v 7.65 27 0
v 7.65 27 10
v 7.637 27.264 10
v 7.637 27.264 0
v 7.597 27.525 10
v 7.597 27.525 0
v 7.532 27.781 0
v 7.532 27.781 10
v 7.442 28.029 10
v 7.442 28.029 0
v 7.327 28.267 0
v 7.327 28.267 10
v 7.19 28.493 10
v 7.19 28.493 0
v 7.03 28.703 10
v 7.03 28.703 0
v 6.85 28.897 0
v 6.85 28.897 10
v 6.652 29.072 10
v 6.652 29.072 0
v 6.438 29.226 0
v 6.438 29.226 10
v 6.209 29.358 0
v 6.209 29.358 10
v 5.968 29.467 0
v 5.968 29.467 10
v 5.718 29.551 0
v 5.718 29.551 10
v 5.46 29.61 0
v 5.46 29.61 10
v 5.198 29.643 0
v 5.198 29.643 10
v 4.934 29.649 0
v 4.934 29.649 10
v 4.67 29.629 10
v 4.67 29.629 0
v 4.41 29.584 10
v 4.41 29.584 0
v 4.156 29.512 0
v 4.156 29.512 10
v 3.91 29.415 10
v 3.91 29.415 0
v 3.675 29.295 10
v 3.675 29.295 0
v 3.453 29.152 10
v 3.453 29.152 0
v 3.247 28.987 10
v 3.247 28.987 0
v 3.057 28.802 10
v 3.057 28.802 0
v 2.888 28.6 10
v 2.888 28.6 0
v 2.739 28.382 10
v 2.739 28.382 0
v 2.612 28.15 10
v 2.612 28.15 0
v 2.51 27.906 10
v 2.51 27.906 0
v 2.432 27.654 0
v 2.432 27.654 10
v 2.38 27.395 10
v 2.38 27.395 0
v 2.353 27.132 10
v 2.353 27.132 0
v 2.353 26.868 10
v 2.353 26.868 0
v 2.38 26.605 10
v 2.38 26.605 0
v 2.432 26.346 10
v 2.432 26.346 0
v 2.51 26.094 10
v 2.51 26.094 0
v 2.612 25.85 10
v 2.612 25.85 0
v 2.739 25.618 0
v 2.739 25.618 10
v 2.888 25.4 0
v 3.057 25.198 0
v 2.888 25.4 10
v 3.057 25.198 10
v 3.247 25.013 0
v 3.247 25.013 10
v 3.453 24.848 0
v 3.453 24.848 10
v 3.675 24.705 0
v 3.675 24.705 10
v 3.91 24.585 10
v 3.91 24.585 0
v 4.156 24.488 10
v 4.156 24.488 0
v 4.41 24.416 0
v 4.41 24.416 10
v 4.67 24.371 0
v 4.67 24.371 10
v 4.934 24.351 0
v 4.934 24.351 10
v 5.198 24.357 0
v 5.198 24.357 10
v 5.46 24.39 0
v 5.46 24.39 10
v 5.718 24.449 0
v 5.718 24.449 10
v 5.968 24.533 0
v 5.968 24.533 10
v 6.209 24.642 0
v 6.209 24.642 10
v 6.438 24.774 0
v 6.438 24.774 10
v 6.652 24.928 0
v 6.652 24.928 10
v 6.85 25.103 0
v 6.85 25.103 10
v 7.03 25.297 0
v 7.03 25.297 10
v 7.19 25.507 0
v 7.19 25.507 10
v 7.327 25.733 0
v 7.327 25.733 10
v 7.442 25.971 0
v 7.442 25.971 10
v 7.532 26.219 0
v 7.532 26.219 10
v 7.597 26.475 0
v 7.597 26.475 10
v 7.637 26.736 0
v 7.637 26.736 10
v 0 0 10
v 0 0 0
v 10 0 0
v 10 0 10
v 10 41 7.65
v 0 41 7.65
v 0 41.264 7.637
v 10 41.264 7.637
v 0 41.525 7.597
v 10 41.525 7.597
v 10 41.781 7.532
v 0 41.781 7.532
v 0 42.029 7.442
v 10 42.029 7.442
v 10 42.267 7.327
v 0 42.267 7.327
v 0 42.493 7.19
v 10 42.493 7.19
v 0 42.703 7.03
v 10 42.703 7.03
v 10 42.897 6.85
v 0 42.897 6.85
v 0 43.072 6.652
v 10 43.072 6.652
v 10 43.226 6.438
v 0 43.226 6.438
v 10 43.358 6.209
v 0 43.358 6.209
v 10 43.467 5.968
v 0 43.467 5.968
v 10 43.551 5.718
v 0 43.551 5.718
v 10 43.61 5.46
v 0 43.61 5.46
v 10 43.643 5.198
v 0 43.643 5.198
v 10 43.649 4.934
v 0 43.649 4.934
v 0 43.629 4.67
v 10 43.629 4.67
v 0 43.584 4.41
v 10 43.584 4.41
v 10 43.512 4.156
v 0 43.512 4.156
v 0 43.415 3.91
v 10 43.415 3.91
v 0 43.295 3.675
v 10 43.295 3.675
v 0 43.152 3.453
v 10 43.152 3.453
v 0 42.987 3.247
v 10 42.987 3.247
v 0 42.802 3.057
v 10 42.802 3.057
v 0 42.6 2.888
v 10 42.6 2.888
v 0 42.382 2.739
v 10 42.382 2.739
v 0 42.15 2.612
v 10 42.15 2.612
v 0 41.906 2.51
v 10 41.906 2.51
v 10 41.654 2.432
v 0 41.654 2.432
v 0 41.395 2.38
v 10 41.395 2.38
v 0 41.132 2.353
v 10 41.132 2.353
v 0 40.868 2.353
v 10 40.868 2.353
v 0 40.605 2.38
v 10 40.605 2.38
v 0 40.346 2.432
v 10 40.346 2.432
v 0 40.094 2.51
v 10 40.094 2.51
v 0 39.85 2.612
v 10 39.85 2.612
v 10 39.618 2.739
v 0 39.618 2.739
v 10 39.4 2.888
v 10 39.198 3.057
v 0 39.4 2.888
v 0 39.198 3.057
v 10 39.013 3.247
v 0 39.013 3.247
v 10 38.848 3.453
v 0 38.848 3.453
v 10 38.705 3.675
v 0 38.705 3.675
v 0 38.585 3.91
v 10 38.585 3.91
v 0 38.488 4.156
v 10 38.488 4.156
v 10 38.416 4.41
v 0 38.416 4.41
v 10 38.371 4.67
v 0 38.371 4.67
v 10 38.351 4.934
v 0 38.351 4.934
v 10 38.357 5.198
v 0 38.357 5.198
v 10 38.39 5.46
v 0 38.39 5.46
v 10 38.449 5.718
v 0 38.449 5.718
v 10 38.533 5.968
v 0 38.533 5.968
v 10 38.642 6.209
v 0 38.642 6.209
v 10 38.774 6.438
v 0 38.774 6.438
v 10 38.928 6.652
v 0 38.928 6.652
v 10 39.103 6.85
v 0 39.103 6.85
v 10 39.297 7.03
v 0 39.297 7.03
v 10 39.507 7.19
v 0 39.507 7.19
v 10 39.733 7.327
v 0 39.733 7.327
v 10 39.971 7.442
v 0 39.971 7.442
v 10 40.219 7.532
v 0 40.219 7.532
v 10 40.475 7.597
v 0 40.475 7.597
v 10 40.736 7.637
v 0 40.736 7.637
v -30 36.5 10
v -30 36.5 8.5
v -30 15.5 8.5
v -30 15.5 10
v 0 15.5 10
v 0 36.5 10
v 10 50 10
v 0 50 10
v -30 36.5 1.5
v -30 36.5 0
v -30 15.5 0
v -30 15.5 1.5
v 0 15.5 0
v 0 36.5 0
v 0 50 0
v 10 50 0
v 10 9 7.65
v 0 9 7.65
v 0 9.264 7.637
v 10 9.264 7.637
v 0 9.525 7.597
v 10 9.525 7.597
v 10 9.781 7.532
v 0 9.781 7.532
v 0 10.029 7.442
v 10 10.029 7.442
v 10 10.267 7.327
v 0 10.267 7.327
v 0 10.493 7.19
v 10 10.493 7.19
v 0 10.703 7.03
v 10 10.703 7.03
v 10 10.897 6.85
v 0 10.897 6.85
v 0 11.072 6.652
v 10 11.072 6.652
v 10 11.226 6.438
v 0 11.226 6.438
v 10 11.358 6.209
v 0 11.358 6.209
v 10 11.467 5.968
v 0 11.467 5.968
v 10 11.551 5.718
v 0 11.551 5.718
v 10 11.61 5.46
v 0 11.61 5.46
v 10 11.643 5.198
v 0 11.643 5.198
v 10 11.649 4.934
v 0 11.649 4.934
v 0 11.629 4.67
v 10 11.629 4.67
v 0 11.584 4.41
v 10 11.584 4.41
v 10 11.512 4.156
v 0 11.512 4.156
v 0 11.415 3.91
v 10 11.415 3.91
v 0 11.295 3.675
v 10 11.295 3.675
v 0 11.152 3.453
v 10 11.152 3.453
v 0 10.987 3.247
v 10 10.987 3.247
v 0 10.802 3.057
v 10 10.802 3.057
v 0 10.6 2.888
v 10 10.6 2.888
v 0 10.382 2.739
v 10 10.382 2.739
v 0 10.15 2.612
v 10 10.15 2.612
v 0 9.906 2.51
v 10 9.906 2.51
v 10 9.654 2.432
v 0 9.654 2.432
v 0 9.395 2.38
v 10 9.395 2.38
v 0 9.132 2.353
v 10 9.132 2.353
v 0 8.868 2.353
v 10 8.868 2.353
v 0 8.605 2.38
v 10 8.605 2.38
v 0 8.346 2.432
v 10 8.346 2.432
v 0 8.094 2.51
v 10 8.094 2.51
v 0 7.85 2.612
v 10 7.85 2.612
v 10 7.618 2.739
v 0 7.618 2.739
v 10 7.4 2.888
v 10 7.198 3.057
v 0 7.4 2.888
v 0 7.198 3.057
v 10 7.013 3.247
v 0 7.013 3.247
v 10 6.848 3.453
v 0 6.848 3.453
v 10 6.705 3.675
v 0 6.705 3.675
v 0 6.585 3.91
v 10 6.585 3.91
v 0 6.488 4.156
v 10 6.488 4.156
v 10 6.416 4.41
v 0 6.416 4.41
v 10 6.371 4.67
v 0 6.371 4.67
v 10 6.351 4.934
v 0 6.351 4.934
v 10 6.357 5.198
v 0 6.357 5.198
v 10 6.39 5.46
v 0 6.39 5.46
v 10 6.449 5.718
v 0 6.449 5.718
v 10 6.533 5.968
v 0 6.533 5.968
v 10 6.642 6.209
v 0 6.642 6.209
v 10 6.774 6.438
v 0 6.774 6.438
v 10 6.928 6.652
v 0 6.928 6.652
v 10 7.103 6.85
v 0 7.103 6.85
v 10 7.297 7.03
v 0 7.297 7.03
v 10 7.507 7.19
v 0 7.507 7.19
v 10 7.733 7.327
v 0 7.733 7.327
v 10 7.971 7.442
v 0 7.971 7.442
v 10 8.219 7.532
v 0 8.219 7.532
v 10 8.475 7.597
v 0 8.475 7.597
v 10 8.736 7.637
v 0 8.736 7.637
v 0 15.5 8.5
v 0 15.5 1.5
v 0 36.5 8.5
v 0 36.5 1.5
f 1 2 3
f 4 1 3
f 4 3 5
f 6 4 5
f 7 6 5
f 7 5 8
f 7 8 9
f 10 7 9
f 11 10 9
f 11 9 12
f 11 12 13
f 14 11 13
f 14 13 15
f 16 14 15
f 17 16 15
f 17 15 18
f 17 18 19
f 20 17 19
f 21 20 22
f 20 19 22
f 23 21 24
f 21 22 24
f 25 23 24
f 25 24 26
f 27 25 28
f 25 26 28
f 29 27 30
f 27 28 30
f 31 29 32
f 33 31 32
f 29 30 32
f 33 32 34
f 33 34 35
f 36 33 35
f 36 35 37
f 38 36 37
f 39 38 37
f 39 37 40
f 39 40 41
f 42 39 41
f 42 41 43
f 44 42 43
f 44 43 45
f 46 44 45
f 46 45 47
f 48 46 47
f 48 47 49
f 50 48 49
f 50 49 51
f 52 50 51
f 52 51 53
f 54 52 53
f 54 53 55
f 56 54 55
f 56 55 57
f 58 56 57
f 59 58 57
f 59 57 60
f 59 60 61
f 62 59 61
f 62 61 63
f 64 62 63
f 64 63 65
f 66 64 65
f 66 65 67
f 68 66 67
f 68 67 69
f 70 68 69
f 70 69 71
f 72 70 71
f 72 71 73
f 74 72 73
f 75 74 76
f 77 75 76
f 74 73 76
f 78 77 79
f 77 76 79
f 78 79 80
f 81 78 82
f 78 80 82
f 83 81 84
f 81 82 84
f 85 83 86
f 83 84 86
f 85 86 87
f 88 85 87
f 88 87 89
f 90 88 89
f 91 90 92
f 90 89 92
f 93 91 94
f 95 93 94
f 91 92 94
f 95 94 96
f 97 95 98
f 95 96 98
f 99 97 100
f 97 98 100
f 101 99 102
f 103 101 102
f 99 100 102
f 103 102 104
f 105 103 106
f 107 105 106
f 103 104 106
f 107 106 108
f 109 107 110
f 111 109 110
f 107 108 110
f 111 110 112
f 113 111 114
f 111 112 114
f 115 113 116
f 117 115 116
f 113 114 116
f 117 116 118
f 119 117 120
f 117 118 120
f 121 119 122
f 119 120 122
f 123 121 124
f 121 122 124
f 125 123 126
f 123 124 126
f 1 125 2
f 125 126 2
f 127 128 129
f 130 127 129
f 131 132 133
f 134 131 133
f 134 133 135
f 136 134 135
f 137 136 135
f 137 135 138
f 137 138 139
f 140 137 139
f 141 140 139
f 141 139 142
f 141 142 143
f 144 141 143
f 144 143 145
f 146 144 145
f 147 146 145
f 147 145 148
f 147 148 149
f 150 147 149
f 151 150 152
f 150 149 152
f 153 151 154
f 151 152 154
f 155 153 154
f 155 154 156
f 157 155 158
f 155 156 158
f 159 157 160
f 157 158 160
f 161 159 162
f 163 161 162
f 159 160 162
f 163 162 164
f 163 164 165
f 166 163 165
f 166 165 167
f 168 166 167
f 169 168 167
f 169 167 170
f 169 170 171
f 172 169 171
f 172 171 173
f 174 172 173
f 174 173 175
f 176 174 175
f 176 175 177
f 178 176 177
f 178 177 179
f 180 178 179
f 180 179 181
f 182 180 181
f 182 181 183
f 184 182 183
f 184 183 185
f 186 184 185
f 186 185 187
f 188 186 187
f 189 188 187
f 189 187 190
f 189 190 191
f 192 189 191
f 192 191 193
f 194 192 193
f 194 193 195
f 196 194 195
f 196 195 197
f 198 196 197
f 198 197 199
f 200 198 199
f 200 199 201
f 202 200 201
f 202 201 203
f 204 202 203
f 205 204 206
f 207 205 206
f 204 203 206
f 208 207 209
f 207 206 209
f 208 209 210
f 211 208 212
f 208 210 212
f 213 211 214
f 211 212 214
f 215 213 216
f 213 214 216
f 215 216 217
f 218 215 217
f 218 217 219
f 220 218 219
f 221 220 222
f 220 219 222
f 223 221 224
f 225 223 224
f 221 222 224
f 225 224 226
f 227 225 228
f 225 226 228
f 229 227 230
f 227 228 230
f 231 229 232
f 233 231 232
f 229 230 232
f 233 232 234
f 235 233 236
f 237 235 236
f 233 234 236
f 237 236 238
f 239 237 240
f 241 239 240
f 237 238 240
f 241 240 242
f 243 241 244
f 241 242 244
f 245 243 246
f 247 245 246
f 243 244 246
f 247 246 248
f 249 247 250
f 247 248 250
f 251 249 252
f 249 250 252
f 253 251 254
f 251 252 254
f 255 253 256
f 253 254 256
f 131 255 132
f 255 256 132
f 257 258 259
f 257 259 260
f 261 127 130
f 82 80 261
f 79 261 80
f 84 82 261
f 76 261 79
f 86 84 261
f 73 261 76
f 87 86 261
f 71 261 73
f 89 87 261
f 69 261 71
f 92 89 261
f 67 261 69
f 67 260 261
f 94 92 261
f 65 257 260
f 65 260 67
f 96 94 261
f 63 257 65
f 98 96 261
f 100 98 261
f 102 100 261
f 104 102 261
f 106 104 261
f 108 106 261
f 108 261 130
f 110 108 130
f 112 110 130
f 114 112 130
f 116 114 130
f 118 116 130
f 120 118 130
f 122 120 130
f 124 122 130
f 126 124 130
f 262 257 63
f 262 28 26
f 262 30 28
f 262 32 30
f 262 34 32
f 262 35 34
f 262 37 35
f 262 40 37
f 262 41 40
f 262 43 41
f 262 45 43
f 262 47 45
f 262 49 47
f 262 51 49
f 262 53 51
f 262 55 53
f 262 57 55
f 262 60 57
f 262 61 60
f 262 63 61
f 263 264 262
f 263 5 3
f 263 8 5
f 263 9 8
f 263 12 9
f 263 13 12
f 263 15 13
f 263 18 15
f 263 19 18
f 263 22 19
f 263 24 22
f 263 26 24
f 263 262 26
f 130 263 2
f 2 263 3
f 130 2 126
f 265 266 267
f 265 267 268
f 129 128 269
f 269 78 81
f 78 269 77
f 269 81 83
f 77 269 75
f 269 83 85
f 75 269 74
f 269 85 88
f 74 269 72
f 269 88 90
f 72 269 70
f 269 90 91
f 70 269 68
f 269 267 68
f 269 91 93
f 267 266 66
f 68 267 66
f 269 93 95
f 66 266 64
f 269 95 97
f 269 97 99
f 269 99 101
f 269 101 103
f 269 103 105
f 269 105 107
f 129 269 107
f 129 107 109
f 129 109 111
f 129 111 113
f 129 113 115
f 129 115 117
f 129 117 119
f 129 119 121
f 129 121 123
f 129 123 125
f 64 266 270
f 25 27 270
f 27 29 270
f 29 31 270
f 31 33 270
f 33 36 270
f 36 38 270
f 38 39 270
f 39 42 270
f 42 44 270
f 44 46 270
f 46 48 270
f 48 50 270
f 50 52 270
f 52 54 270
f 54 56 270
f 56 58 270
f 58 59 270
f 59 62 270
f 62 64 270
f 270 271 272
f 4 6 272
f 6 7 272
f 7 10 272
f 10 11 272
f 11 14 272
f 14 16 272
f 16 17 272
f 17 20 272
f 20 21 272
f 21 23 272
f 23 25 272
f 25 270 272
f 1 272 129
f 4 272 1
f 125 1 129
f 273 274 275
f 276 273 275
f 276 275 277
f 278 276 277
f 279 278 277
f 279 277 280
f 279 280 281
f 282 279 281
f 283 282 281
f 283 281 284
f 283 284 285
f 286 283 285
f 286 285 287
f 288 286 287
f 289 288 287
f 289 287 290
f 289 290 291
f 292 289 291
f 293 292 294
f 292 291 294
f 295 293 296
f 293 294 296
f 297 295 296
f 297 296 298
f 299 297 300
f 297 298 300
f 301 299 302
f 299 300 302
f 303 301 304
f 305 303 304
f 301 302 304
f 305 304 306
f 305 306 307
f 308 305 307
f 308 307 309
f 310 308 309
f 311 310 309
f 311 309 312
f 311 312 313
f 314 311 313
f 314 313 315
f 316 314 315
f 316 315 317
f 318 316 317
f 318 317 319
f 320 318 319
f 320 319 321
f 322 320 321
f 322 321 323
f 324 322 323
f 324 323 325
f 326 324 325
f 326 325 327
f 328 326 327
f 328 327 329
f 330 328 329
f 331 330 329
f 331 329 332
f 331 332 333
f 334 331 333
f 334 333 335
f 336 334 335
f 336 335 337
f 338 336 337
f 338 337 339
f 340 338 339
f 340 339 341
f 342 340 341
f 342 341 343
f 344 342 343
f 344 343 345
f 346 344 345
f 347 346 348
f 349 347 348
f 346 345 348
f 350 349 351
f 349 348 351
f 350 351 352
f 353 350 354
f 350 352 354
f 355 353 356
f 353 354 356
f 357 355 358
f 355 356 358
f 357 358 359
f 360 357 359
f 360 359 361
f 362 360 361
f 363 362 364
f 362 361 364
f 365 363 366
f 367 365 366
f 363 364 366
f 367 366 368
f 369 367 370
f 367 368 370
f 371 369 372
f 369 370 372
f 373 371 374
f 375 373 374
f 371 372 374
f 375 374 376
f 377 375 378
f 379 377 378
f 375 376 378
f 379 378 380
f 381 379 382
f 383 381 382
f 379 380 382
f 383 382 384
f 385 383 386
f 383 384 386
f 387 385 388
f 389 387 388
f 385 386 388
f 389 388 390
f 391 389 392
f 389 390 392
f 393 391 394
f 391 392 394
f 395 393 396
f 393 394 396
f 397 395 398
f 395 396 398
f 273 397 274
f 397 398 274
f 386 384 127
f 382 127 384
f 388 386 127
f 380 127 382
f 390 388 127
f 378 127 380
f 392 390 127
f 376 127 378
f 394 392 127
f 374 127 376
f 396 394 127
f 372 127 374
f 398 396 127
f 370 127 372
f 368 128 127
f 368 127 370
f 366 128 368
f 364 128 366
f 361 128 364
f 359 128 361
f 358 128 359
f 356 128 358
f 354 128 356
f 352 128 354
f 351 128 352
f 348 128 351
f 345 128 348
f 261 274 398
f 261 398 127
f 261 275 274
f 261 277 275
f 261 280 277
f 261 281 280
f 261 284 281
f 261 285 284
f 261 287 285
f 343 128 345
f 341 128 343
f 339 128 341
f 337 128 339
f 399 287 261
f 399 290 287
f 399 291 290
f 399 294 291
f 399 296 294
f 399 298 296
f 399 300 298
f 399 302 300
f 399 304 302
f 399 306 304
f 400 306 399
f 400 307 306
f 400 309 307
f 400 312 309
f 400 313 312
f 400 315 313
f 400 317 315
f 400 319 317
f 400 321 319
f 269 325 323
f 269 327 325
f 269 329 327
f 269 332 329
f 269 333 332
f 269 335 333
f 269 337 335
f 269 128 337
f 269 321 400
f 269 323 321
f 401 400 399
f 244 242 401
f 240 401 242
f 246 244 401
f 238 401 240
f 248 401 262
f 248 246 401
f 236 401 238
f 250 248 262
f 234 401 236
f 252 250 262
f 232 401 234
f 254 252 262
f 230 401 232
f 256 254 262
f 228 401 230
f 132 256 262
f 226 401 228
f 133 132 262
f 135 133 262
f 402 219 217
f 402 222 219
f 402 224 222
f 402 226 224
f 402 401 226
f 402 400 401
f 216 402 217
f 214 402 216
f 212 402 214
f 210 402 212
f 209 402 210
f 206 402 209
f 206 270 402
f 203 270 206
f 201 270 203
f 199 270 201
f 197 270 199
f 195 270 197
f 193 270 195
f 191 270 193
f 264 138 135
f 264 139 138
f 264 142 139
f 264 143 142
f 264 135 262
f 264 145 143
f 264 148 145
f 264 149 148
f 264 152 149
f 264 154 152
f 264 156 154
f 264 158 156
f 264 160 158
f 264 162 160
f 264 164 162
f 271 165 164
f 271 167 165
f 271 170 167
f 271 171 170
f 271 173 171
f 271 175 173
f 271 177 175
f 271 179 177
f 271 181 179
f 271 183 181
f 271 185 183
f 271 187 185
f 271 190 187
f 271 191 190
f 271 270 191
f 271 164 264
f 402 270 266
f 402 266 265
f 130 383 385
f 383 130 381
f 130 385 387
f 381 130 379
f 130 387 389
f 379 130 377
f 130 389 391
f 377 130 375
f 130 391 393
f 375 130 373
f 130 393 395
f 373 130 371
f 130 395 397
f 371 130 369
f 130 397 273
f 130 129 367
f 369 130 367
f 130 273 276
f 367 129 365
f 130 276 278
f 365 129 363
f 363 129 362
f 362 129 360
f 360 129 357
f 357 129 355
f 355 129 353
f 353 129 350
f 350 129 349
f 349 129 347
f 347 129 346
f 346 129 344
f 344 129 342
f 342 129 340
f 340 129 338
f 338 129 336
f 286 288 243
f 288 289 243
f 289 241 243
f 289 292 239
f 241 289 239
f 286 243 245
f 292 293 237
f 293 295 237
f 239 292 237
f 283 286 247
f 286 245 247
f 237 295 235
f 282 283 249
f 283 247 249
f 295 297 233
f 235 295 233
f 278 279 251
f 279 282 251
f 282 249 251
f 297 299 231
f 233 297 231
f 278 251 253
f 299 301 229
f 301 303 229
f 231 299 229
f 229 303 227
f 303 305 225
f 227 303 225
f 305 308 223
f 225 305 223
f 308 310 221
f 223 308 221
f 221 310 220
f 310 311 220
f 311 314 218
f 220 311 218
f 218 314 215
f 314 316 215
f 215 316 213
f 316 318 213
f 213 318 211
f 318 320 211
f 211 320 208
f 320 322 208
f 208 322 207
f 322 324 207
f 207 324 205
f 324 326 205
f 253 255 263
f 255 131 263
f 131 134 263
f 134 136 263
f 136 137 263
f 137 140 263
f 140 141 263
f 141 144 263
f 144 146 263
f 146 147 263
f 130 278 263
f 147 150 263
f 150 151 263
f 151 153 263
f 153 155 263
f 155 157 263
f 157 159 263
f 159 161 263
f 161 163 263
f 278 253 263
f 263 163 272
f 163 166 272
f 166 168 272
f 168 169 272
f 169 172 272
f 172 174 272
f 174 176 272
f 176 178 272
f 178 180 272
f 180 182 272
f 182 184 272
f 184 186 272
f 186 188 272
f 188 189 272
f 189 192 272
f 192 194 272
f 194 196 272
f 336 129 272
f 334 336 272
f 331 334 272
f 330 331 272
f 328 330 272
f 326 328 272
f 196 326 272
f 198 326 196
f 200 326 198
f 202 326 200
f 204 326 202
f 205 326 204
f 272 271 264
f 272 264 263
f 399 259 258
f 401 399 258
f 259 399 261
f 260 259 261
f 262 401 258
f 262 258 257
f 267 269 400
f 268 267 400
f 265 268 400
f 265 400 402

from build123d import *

# Parameters (mm, degrees)
SKETCH2_W           = 10
SKETCH2_H           = 50
BOSS_EXTRUDE1_DEPTH = 10
SKETCH6_R           = 2.65
CUT_EXTRUDE3_DEPTH  = 11
SKETCH7_R           = 2.65
CUT_EXTRUDE4_DEPTH  = 11
SKETCH8_W           = 1.5
SKETCH8_H           = 21
BOSS_EXTRUDE2_DEPTH = 30


with BuildPart() as part:
    # Sketch2 → Boss-Extrude1 (new body)
    with BuildSketch(Plane.XY):
        with Locations((5, 25)):
            Rectangle(SKETCH2_W, SKETCH2_H)
    extrude(amount=BOSS_EXTRUDE1_DEPTH)

    # Sketch6 → Cut-Extrude3 (cut, through all)
    with BuildSketch(Plane.XY.offset(10)):
        with Locations((5, 27)):
            Circle(SKETCH6_R)
    extrude(amount=-CUT_EXTRUDE3_DEPTH, mode=Mode.SUBTRACT)

    # Sketch7 → Cut-Extrude4 (cut, through all)
    with BuildSketch(Plane.ZY):
        with Locations((5, 41)):
            Circle(SKETCH7_R)
        with Locations((5, 9)):
            Circle(SKETCH7_R)
    extrude(amount=-CUT_EXTRUDE4_DEPTH, mode=Mode.SUBTRACT)

    # Sketch8 → Boss-Extrude2 (add)
    with BuildSketch(Plane.ZY):
        with Locations((9.25, 26)):
            Rectangle(SKETCH8_W, SKETCH8_H)
        with Locations((0.75, 26)):
            Rectangle(SKETCH8_W, SKETCH8_H)
    extrude(amount=BOSS_EXTRUDE2_DEPTH)


solid = part.part
